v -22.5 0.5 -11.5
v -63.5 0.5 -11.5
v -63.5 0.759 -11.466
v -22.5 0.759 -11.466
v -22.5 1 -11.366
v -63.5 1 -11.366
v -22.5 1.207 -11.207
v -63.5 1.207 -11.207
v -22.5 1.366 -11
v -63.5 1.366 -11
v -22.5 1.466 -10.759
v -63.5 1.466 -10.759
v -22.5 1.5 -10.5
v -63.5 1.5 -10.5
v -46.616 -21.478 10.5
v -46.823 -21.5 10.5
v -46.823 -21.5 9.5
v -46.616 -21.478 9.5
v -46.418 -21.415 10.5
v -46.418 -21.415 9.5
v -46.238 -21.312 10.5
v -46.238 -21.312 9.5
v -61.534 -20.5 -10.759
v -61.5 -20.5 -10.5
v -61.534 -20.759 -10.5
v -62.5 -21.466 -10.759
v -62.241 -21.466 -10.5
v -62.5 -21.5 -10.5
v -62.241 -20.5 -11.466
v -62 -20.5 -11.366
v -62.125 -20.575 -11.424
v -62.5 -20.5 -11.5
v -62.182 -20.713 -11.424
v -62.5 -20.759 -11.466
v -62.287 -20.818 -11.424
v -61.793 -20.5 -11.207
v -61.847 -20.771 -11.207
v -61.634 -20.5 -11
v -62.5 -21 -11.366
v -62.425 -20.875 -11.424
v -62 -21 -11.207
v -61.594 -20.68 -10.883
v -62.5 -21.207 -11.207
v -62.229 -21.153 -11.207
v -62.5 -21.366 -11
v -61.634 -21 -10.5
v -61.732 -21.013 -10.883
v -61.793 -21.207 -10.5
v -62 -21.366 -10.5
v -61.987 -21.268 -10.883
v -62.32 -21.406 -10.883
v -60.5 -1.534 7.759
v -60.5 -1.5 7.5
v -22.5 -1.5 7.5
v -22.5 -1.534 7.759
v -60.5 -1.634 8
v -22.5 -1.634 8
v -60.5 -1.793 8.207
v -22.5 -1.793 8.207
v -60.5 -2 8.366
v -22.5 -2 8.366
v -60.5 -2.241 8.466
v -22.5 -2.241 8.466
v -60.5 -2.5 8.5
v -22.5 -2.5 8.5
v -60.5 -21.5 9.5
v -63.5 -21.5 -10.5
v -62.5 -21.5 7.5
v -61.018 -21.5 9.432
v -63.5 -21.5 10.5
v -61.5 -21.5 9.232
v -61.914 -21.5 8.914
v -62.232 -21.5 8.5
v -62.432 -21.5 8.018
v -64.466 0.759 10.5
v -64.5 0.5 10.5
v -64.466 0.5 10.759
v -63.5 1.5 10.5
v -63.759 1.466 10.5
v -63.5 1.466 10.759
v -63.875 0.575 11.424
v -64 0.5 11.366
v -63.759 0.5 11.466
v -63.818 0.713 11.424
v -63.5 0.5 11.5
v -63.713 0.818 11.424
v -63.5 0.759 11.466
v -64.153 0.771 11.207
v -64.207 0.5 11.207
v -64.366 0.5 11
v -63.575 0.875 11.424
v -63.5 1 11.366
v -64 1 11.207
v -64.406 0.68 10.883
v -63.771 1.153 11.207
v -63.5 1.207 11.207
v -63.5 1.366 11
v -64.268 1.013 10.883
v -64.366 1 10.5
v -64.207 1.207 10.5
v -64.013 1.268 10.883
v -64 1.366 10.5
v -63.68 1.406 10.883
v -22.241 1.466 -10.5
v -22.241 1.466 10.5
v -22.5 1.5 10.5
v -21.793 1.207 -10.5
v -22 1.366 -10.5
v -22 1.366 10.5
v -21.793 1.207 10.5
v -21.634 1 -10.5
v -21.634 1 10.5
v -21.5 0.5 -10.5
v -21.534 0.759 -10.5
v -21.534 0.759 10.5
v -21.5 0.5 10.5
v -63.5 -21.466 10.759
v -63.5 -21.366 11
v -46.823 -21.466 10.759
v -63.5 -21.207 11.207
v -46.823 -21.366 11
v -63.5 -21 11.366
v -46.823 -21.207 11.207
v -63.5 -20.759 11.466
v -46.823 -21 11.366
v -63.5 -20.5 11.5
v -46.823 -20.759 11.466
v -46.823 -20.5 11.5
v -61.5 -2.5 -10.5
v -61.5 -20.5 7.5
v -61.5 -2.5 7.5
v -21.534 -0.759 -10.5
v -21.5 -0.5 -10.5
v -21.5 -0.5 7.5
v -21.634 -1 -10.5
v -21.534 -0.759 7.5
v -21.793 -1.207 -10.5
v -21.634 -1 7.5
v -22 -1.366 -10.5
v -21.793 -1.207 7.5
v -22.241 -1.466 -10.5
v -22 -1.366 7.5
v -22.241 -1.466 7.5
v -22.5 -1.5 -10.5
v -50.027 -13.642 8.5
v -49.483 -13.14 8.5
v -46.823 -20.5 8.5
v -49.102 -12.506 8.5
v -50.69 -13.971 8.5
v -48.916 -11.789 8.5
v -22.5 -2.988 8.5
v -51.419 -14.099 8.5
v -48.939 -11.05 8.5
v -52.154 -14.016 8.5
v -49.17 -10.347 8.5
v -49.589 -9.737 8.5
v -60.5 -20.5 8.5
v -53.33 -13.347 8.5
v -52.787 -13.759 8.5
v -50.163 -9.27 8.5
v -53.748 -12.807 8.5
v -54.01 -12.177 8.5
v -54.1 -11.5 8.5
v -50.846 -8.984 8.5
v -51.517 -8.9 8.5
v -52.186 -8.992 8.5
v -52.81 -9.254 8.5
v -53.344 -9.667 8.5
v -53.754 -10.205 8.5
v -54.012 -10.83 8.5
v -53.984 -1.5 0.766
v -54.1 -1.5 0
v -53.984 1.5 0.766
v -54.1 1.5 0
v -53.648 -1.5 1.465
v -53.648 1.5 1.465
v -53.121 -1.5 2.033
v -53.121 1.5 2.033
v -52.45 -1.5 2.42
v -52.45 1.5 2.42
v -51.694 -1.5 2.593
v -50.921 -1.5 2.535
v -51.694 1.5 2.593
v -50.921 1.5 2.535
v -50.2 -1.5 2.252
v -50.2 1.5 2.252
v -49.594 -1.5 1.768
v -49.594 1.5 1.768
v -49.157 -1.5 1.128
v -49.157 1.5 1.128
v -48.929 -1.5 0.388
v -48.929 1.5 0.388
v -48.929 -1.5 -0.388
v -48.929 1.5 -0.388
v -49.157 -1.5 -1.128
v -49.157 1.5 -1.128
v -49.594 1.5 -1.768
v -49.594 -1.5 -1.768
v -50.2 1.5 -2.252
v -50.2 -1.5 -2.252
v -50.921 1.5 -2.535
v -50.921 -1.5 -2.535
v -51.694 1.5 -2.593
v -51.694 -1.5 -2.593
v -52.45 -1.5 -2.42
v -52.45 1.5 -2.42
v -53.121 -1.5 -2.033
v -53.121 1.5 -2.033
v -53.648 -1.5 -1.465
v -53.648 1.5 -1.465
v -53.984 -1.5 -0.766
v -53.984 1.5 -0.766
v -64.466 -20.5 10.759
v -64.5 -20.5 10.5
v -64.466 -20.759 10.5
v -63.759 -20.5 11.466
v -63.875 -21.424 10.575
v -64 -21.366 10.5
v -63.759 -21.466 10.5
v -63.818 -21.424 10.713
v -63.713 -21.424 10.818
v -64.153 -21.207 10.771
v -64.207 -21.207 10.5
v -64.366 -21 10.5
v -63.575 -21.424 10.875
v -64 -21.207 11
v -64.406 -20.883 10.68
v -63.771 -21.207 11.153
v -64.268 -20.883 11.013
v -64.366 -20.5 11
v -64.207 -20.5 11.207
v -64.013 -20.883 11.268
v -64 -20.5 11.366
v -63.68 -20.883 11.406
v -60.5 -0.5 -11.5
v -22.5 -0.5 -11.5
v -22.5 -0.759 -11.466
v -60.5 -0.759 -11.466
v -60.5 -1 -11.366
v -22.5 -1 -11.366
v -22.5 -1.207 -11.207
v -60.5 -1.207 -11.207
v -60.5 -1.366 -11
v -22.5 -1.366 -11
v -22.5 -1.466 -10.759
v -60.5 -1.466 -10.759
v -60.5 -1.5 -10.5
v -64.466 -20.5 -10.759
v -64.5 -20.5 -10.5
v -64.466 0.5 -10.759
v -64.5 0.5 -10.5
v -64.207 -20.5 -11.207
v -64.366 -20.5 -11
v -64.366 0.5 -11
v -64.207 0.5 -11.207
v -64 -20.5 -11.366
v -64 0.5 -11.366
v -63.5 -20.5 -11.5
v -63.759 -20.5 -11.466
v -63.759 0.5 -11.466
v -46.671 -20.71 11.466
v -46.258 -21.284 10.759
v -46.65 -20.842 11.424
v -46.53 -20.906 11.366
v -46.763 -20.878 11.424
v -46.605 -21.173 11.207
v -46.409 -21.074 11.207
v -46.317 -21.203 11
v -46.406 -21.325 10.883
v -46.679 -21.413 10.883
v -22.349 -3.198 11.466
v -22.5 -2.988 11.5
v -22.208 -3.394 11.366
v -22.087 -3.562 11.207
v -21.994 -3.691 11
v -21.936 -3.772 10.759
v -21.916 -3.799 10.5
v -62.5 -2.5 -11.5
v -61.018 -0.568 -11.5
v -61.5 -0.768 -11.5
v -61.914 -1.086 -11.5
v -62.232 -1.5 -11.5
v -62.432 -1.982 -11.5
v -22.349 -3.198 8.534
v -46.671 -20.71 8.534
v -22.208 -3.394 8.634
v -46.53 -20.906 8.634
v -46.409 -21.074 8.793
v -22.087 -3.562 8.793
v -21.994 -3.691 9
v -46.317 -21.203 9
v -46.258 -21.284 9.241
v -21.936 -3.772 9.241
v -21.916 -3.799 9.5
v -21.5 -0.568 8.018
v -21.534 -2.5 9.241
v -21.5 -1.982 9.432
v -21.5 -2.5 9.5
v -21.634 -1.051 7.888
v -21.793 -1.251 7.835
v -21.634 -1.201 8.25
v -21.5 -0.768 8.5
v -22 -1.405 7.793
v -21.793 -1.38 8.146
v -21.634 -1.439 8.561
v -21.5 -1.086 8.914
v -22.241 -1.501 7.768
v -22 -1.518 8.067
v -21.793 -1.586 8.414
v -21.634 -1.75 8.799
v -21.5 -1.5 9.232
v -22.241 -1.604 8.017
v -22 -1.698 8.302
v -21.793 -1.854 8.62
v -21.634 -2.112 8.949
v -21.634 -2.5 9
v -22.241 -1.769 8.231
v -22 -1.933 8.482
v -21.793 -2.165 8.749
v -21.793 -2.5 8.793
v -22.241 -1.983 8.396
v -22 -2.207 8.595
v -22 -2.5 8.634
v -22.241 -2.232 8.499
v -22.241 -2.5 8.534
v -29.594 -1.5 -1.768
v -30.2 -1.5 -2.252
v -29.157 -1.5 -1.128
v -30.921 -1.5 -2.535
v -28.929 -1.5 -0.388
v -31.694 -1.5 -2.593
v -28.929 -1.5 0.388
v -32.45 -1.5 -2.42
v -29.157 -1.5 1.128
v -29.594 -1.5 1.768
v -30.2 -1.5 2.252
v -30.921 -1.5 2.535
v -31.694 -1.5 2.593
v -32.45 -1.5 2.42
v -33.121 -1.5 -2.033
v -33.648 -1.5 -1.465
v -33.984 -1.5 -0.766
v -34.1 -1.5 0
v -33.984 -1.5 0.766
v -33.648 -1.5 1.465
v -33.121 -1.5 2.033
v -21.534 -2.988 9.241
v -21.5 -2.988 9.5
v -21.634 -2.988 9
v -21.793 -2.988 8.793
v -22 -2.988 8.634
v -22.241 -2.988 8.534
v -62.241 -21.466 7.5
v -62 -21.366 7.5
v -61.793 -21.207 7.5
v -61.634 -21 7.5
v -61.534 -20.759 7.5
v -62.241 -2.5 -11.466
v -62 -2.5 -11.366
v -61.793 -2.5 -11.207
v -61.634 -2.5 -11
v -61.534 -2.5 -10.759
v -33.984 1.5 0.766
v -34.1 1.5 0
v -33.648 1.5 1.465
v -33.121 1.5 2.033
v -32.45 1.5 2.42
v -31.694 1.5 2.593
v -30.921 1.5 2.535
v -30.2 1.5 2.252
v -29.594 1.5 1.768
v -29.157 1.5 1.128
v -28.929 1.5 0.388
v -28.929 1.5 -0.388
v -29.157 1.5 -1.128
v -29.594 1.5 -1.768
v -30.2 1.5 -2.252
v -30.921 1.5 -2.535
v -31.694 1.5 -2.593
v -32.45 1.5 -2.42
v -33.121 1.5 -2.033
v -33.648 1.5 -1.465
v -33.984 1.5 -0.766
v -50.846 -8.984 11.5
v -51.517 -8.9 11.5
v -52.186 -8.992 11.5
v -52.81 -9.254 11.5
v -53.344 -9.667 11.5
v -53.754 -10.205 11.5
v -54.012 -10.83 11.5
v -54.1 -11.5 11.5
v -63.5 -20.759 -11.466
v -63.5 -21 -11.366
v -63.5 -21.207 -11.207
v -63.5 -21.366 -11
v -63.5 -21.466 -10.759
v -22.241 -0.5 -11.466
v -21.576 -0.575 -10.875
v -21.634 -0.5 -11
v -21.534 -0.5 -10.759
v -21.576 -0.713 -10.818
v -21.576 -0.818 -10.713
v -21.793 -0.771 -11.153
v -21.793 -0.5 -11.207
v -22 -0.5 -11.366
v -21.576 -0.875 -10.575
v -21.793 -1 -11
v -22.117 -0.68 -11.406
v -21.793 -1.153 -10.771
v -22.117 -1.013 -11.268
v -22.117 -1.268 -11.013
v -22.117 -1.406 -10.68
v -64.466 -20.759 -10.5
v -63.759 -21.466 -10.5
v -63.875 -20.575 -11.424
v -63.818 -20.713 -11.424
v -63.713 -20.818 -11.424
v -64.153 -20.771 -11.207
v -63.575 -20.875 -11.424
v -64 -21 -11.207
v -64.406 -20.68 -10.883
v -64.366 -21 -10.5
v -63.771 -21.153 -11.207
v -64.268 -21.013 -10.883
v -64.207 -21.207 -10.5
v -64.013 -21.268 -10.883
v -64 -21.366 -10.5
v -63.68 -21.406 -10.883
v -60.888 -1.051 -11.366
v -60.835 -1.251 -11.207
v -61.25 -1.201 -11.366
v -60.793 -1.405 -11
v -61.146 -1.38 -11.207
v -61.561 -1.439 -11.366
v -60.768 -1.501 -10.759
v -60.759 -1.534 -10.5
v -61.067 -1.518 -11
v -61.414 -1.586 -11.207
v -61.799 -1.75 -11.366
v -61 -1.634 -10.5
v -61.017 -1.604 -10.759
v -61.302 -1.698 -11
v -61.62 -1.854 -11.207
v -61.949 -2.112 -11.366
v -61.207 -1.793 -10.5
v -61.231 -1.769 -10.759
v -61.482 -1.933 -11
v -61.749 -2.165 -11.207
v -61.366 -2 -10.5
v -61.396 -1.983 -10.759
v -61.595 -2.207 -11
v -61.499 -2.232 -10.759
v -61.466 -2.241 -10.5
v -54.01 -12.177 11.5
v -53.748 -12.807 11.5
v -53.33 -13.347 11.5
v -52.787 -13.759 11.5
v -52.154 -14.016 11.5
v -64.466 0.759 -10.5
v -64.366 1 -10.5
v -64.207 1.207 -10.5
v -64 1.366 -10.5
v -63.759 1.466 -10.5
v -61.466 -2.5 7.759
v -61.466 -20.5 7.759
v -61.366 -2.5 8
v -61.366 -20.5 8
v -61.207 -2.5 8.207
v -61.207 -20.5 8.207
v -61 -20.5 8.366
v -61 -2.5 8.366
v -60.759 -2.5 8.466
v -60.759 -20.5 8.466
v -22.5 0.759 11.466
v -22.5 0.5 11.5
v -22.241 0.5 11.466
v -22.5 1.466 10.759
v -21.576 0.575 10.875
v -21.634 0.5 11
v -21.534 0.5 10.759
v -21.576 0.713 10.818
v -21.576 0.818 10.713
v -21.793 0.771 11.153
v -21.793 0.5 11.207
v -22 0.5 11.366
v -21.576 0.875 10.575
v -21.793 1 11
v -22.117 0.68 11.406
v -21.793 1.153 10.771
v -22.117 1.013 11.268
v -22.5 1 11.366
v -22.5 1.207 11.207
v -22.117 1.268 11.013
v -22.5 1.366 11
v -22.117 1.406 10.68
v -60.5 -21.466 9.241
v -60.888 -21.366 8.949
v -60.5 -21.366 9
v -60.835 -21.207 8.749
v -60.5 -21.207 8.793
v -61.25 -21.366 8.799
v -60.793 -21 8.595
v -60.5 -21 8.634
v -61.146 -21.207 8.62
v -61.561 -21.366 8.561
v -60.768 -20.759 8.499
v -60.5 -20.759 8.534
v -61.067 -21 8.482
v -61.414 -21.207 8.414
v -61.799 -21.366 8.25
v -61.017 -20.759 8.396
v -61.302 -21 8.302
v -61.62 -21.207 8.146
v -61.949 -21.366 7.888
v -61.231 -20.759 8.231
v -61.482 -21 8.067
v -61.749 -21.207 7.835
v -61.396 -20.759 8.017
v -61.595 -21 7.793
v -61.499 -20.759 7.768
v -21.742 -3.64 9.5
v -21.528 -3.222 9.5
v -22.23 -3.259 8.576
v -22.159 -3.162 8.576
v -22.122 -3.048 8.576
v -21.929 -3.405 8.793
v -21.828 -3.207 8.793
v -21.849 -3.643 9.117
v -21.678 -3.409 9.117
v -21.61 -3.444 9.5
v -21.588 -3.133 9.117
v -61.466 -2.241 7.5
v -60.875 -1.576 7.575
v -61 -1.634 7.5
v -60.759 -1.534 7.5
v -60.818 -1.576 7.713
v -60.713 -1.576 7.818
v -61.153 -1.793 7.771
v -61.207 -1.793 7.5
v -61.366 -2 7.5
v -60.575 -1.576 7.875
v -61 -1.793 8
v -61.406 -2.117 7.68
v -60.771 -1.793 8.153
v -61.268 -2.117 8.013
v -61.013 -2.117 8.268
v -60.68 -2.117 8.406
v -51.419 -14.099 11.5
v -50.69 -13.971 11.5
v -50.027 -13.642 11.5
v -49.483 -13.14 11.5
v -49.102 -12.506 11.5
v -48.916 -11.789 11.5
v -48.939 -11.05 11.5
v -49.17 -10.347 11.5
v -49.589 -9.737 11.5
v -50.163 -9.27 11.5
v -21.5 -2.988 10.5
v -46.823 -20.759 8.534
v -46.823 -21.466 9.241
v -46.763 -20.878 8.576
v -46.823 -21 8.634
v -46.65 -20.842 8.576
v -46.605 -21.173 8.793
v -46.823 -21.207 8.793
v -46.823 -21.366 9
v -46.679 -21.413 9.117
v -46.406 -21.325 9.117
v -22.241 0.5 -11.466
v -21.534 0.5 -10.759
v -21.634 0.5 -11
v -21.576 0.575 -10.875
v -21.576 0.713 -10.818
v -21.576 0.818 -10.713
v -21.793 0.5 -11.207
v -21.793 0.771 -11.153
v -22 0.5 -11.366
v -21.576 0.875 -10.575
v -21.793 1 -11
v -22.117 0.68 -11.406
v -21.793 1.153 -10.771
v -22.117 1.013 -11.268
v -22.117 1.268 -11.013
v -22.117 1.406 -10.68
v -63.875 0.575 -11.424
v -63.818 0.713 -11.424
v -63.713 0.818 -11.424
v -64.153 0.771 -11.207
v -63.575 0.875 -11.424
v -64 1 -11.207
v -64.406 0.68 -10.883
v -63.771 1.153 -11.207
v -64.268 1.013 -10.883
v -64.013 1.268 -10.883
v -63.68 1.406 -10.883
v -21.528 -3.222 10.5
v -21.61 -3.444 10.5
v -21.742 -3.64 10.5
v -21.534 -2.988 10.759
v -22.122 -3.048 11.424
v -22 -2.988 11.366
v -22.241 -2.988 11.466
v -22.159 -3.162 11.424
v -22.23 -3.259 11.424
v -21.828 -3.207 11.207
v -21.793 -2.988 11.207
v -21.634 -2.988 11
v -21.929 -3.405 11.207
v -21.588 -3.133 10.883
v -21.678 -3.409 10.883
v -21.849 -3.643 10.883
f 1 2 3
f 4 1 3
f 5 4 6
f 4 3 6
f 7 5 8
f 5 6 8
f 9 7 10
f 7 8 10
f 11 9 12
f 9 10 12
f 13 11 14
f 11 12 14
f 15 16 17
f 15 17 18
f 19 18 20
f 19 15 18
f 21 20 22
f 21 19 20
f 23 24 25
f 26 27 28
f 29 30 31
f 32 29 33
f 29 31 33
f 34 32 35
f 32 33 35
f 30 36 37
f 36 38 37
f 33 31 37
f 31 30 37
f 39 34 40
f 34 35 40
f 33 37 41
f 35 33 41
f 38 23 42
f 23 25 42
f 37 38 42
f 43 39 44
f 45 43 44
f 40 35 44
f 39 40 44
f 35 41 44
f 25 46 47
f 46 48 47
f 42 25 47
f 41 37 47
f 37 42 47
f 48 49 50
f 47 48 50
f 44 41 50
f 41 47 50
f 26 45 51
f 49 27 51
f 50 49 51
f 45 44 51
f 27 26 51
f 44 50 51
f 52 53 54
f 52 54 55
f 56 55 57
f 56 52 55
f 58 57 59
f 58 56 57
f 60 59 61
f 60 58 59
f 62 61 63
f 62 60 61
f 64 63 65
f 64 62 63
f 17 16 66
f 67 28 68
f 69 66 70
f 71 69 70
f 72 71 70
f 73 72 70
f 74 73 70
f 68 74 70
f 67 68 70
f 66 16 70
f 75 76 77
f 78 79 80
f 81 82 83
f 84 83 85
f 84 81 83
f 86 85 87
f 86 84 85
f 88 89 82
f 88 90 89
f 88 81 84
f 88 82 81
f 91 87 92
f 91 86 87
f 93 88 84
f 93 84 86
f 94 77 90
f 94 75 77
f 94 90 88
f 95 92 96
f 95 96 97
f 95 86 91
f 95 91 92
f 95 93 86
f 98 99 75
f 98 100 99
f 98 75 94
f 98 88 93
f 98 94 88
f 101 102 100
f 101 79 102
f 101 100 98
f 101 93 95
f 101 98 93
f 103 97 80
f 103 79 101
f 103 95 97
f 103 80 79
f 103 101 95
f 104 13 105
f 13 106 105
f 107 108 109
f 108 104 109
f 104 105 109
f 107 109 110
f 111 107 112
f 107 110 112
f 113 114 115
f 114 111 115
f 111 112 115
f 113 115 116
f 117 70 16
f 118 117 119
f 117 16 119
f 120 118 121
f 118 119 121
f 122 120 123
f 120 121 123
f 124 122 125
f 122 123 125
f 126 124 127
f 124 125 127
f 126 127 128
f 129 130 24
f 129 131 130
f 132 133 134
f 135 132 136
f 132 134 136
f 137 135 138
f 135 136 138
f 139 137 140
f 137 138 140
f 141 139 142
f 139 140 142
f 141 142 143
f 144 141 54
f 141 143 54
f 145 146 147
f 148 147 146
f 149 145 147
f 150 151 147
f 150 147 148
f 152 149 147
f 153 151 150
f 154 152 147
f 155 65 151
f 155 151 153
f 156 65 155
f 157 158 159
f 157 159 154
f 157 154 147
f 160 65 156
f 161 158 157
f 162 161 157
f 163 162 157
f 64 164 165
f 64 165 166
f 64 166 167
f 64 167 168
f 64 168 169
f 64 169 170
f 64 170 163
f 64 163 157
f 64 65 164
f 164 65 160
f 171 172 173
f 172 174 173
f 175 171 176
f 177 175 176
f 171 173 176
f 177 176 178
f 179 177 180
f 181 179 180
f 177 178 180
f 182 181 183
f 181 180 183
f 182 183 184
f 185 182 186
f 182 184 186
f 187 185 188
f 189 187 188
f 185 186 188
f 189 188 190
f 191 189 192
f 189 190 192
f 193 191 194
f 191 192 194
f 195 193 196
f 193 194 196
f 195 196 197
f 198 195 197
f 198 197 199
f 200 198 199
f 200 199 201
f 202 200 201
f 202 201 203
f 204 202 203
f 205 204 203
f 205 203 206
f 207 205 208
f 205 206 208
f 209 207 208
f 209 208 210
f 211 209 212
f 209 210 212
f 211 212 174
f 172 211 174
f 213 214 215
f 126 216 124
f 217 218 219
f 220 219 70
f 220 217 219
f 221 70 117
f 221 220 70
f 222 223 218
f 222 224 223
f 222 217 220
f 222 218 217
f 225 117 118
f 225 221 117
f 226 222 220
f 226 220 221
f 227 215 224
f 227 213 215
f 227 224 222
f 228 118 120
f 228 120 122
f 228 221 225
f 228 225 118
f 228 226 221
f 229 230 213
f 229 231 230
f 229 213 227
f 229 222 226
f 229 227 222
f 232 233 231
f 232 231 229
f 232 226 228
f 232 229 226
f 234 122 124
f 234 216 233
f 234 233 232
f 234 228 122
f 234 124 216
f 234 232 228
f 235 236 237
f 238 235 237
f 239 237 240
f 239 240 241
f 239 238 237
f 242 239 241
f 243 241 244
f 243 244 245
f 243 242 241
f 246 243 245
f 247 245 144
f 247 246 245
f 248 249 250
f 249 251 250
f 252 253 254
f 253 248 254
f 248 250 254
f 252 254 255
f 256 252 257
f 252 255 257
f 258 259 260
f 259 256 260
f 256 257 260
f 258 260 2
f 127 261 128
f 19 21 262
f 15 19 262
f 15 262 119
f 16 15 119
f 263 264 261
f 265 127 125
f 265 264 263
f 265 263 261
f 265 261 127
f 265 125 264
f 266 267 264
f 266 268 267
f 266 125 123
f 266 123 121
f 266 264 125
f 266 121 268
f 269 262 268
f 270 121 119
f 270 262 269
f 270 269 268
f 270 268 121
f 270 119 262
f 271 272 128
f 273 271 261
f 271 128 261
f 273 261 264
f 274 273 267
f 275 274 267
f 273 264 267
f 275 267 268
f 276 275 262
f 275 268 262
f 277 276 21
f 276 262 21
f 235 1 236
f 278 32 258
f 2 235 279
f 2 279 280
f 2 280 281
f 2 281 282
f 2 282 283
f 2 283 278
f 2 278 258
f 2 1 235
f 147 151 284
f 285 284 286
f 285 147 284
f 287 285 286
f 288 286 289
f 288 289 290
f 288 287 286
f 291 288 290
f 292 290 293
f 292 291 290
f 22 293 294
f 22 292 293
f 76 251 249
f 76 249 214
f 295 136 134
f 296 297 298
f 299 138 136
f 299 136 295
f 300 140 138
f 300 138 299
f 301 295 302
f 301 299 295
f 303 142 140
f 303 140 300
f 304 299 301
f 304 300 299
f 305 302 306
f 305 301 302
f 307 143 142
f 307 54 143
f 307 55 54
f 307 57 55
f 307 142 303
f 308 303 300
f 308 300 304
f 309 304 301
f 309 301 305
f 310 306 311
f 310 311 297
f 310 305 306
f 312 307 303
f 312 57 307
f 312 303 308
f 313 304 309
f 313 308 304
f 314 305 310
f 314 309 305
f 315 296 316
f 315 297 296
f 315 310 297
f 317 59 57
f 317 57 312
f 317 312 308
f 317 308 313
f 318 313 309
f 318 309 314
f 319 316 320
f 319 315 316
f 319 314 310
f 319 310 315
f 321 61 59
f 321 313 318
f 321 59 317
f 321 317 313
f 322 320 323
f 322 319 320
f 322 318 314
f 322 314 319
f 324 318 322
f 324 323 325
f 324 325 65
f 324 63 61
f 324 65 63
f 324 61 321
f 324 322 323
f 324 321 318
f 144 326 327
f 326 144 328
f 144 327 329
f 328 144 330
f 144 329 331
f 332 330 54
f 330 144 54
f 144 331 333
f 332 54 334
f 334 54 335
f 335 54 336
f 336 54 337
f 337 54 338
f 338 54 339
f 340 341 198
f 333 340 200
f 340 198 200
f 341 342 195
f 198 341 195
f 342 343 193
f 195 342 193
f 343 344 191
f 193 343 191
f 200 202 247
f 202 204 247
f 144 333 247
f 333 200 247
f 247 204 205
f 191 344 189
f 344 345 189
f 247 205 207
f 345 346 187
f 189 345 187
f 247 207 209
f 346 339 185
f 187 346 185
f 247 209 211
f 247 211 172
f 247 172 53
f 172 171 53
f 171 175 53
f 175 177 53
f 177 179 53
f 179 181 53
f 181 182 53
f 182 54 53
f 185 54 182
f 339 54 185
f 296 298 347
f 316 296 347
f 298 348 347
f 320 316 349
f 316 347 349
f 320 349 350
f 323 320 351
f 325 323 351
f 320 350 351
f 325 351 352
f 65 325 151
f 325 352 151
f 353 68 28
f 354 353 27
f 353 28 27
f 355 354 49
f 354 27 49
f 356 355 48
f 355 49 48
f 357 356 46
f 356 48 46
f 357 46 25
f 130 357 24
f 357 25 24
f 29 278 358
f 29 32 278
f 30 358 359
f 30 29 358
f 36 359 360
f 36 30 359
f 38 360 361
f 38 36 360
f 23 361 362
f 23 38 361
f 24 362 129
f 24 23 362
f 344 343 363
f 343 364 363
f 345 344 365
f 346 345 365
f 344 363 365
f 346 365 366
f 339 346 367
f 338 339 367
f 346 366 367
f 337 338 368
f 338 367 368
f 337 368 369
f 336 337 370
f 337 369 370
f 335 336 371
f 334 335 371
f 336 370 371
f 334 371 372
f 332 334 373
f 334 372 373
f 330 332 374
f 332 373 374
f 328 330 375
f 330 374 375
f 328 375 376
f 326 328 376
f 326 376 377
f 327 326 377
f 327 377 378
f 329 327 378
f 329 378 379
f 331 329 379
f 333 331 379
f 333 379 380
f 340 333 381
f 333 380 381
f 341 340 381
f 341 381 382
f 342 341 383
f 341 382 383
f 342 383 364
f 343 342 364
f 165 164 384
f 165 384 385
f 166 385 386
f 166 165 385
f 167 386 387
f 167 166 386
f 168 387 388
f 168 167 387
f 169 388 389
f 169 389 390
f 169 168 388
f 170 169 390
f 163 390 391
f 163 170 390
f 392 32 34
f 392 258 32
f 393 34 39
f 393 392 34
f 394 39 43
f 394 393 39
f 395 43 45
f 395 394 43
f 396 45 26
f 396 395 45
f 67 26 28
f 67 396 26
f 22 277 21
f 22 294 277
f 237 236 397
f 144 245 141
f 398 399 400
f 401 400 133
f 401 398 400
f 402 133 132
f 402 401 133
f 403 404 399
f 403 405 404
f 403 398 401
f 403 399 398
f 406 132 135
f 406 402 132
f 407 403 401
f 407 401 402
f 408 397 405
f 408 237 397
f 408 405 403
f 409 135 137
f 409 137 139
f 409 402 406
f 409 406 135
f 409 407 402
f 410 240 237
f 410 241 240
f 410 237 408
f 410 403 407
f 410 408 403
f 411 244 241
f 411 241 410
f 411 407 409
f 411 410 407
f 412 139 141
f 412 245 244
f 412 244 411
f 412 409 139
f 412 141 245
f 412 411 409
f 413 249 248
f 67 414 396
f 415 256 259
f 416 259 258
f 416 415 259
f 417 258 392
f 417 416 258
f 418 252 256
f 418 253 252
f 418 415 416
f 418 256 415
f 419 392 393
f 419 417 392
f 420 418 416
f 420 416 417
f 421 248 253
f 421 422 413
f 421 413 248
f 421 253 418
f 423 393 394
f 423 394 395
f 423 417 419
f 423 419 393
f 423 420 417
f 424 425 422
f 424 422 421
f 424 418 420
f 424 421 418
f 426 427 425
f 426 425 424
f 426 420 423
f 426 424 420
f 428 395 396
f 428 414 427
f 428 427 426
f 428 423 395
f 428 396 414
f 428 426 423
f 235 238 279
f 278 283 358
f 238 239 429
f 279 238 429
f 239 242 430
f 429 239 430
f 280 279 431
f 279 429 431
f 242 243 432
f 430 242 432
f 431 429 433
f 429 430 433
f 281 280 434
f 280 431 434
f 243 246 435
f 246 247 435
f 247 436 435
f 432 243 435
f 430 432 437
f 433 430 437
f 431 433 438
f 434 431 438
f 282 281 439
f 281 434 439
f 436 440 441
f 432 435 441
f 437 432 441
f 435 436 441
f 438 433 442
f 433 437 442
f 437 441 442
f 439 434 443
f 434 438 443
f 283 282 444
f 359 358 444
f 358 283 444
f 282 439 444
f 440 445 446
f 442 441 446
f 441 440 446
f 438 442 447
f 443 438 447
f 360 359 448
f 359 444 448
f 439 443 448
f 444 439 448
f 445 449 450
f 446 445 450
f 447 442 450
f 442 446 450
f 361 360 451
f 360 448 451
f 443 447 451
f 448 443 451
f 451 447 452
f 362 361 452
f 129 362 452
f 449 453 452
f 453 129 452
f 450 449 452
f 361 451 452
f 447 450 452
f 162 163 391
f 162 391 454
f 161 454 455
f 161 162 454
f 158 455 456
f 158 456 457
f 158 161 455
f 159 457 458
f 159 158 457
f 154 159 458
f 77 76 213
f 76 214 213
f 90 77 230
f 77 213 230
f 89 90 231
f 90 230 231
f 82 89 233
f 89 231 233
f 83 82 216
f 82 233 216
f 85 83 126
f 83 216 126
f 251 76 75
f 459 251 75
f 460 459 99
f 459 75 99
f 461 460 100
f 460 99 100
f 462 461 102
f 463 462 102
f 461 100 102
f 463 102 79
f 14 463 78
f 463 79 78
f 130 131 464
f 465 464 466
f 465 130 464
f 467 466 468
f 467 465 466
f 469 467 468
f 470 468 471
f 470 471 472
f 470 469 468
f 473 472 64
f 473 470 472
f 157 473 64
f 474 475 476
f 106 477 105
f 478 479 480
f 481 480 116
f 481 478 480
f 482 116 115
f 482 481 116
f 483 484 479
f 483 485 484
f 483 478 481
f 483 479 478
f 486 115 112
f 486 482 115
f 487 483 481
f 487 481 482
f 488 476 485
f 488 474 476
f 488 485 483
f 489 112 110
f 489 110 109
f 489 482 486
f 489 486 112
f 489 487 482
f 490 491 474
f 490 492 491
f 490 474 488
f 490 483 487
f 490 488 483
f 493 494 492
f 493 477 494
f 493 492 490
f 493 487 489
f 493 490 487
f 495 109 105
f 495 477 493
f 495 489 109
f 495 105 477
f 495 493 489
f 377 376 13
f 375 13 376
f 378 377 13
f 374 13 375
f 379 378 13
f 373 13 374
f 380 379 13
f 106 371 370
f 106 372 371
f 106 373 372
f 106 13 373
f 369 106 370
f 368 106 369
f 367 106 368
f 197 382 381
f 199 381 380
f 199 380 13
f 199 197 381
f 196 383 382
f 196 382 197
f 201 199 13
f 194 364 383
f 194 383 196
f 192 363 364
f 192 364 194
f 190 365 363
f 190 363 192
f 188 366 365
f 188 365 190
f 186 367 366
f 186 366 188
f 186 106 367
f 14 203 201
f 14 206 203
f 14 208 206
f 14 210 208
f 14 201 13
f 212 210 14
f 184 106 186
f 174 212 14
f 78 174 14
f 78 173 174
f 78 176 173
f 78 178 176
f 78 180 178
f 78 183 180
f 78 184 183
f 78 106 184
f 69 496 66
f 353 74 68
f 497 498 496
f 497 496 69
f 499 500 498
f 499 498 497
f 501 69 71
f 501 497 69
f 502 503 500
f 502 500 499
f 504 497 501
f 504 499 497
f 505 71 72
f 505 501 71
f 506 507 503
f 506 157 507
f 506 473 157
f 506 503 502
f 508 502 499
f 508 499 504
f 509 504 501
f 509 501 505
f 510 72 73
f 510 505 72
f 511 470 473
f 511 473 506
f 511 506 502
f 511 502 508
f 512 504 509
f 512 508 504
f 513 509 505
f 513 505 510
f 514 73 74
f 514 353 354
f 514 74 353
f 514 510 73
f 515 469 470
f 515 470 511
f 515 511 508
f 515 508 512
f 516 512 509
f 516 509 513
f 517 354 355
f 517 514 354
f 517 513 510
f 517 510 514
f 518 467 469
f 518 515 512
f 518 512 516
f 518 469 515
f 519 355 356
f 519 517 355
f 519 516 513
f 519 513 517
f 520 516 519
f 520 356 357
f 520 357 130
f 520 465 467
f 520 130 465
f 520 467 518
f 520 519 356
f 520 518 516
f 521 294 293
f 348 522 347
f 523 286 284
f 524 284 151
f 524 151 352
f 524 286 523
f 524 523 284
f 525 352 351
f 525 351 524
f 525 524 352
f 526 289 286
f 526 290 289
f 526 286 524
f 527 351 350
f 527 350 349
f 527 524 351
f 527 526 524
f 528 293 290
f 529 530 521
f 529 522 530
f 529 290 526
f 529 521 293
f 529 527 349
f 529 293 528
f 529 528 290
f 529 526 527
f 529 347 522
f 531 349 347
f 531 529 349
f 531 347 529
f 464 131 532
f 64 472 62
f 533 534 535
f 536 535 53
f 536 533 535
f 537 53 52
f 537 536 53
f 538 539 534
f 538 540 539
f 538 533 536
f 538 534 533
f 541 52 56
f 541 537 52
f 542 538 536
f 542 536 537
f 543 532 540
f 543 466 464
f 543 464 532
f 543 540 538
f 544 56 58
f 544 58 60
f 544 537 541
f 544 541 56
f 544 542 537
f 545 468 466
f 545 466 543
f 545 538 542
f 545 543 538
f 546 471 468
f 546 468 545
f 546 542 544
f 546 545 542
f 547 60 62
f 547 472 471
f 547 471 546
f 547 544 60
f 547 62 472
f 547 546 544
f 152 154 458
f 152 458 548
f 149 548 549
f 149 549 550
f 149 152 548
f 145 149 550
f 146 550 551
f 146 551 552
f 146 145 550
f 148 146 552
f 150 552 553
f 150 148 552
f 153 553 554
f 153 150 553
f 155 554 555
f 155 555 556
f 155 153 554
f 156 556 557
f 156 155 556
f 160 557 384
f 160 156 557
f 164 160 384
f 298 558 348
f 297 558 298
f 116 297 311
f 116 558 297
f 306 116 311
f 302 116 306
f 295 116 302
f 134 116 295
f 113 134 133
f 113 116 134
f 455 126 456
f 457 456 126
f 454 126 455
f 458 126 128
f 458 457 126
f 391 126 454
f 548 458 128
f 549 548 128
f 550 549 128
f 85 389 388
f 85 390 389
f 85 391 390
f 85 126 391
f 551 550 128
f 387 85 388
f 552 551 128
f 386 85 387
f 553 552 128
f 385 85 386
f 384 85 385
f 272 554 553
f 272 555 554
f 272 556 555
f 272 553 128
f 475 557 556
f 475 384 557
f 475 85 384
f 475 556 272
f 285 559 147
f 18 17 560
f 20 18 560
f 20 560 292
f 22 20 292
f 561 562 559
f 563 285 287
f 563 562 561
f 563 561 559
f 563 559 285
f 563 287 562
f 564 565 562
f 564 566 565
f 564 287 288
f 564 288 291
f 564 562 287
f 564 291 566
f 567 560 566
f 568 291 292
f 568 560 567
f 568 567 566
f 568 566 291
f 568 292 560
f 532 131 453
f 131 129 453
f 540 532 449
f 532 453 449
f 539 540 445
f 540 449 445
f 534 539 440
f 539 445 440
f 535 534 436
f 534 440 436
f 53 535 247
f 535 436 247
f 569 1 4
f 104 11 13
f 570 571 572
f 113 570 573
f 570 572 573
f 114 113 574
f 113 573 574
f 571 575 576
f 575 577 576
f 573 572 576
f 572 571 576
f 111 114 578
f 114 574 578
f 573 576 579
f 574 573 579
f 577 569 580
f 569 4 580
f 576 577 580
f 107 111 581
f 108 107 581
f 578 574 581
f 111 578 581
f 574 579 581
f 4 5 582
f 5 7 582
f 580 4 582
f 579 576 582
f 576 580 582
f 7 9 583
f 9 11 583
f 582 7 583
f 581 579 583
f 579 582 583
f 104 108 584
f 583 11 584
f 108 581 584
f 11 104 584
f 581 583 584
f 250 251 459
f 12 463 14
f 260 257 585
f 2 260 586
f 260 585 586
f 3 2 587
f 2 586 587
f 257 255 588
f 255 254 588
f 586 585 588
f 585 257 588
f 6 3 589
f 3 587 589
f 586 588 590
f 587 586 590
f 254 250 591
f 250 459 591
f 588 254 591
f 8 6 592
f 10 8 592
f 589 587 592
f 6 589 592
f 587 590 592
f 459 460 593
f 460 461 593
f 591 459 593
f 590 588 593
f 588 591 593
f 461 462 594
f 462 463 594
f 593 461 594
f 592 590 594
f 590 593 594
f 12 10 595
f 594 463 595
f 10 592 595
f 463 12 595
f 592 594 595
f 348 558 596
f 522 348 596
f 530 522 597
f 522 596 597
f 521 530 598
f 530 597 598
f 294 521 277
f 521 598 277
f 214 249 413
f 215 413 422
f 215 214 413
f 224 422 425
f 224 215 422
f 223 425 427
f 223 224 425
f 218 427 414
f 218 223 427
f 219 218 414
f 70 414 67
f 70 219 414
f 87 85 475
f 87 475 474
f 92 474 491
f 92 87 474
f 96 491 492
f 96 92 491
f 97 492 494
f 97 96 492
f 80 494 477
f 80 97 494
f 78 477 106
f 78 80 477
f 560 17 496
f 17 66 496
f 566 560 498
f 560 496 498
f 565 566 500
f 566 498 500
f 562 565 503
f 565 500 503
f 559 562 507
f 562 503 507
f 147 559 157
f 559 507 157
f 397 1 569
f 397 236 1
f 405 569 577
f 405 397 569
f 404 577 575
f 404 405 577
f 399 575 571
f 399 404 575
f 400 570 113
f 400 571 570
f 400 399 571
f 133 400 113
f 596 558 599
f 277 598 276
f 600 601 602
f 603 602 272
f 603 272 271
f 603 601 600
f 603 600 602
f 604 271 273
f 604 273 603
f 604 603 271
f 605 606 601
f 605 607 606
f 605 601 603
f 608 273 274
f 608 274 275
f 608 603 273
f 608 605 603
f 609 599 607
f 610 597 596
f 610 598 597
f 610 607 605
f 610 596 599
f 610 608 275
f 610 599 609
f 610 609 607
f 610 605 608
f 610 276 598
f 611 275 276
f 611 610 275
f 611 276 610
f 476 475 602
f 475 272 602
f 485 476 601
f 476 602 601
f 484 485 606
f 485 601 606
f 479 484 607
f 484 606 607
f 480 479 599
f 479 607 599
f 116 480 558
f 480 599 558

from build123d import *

# Parameters (mm, degrees)
F0_W     = 43
F0_H     = 23
F0_R     = 2.6
F1_DEPTH = 1.5
F3_DEPTH = 20
F5_DEPTH = 3.001
F7_DEPTH = 3.001
F8_R     = 1


with BuildPart() as f1:
    # F0 (on Front) → F1 (new body, symmetric)
    with BuildSketch(Plane.XZ):
        Rectangle(F0_W, F0_H)
        with Locations((-11.5, 0)):
            Circle(F0_R, mode=Mode.SUBTRACT)
        with Locations((8.5, 0)):
            Circle(F0_R, mode=Mode.SUBTRACT)
    extrude(amount=F1_DEPTH, both=True)

    # F2 (on face) → F3 (join)
    with BuildSketch(Plane.XZ.offset(1.5)):
        Polygon((21.5, -11.5), (21.5, 11.5), (-21.5, 11.5), (-21.5, 8.5), (18.5, 8.5), (18.5, -11.5), align=None)
    extrude(amount=F3_DEPTH)

    # F4 (on face) → F5 (cut, through all)
    with BuildSketch(Plane(origin=(0, 0, 8.5), x_dir=(1, 0, 0), z_dir=(0, 0, -1))):
        with BuildLine():
            ThreePointArc((9.1542480146, 14.0163385176), (5.9836614824, 12.1542480146), (7.8457519854, 8.9836614824))
            Line((7.8457519854, 8.9836614824), (9.1542480146, 14.0163385176))
        make_face()
        with BuildLine():
            Line((9.1542480146, 14.0163385176), (7.8457519854, 8.9836614824))
            ThreePointArc((7.8457519854, 8.9836614824), (10.0904331426, 9.4431766194), (11.1, 11.5))
            ThreePointArc((11.1, 11.5), (10.5568233806, 13.0904331426), (9.1542480146, 14.0163385176))
        make_face()
    extrude(amount=-F5_DEPTH, mode=Mode.SUBTRACT)

    # F6 (on face) → F7 (cut, through all)
    with BuildSketch(Plane(origin=(0, 0, 8.5), x_dir=(1, 0, 0), z_dir=(0, 0, -1))):
        Polygon((-21.5, 3.5), (3.5, 21.5), (-21.5, 21.5), align=None)
    extrude(amount=-F7_DEPTH, mode=Mode.SUBTRACT)

    # F8
    f8_edges = [f1.edges().sort_by_distance(p)[0] for p in [
        (21.5, 1.5, 0),
        (21.5, -10, 11.5),
        (21.5, -21.5, 0),
        (21.5, -10, -11.5),
        (0, 1.5, -11.5),
        (0, 1.5, 11.5),
        (-21.5, -1, 11.5),
        (-9, -12.5, 11.5),
        (12.5, -21.5, 11.5),
        (-9, -12.5, 8.5),
        (3.5, -21.5, 10),
        (11, -21.5, 8.5),
        (18.5, -21.5, -1.5),
        (-1.5, -1.5, -11.5),
        (18.5, -11.5, 8.5),
        (18.5, -11.5, -11.5),
        (18.5, -1.5, -1.5),
        (20, -21.5, -11.5),
        (-21.5, 0, -11.5),
        (-21.5, 1.5, 0),
        (-21.5, -1.5, -1.5),
        (-21.5, -2.5, 8.5),
        (-21.5, -3.5, 10),
        (-1.5, -1.5, 8.5),
    ]]
    fillet(f8_edges, radius=F8_R)


with BuildPart() as f10_1:
    # F10: instance of F1
    add(f1.part.mirror(Plane(origin=(-21.5, -0.2115756963, 1.3410341816), x_dir=(0, -1, 0), z_dir=(-1, 0, 0))))


solid = f10_1.part
